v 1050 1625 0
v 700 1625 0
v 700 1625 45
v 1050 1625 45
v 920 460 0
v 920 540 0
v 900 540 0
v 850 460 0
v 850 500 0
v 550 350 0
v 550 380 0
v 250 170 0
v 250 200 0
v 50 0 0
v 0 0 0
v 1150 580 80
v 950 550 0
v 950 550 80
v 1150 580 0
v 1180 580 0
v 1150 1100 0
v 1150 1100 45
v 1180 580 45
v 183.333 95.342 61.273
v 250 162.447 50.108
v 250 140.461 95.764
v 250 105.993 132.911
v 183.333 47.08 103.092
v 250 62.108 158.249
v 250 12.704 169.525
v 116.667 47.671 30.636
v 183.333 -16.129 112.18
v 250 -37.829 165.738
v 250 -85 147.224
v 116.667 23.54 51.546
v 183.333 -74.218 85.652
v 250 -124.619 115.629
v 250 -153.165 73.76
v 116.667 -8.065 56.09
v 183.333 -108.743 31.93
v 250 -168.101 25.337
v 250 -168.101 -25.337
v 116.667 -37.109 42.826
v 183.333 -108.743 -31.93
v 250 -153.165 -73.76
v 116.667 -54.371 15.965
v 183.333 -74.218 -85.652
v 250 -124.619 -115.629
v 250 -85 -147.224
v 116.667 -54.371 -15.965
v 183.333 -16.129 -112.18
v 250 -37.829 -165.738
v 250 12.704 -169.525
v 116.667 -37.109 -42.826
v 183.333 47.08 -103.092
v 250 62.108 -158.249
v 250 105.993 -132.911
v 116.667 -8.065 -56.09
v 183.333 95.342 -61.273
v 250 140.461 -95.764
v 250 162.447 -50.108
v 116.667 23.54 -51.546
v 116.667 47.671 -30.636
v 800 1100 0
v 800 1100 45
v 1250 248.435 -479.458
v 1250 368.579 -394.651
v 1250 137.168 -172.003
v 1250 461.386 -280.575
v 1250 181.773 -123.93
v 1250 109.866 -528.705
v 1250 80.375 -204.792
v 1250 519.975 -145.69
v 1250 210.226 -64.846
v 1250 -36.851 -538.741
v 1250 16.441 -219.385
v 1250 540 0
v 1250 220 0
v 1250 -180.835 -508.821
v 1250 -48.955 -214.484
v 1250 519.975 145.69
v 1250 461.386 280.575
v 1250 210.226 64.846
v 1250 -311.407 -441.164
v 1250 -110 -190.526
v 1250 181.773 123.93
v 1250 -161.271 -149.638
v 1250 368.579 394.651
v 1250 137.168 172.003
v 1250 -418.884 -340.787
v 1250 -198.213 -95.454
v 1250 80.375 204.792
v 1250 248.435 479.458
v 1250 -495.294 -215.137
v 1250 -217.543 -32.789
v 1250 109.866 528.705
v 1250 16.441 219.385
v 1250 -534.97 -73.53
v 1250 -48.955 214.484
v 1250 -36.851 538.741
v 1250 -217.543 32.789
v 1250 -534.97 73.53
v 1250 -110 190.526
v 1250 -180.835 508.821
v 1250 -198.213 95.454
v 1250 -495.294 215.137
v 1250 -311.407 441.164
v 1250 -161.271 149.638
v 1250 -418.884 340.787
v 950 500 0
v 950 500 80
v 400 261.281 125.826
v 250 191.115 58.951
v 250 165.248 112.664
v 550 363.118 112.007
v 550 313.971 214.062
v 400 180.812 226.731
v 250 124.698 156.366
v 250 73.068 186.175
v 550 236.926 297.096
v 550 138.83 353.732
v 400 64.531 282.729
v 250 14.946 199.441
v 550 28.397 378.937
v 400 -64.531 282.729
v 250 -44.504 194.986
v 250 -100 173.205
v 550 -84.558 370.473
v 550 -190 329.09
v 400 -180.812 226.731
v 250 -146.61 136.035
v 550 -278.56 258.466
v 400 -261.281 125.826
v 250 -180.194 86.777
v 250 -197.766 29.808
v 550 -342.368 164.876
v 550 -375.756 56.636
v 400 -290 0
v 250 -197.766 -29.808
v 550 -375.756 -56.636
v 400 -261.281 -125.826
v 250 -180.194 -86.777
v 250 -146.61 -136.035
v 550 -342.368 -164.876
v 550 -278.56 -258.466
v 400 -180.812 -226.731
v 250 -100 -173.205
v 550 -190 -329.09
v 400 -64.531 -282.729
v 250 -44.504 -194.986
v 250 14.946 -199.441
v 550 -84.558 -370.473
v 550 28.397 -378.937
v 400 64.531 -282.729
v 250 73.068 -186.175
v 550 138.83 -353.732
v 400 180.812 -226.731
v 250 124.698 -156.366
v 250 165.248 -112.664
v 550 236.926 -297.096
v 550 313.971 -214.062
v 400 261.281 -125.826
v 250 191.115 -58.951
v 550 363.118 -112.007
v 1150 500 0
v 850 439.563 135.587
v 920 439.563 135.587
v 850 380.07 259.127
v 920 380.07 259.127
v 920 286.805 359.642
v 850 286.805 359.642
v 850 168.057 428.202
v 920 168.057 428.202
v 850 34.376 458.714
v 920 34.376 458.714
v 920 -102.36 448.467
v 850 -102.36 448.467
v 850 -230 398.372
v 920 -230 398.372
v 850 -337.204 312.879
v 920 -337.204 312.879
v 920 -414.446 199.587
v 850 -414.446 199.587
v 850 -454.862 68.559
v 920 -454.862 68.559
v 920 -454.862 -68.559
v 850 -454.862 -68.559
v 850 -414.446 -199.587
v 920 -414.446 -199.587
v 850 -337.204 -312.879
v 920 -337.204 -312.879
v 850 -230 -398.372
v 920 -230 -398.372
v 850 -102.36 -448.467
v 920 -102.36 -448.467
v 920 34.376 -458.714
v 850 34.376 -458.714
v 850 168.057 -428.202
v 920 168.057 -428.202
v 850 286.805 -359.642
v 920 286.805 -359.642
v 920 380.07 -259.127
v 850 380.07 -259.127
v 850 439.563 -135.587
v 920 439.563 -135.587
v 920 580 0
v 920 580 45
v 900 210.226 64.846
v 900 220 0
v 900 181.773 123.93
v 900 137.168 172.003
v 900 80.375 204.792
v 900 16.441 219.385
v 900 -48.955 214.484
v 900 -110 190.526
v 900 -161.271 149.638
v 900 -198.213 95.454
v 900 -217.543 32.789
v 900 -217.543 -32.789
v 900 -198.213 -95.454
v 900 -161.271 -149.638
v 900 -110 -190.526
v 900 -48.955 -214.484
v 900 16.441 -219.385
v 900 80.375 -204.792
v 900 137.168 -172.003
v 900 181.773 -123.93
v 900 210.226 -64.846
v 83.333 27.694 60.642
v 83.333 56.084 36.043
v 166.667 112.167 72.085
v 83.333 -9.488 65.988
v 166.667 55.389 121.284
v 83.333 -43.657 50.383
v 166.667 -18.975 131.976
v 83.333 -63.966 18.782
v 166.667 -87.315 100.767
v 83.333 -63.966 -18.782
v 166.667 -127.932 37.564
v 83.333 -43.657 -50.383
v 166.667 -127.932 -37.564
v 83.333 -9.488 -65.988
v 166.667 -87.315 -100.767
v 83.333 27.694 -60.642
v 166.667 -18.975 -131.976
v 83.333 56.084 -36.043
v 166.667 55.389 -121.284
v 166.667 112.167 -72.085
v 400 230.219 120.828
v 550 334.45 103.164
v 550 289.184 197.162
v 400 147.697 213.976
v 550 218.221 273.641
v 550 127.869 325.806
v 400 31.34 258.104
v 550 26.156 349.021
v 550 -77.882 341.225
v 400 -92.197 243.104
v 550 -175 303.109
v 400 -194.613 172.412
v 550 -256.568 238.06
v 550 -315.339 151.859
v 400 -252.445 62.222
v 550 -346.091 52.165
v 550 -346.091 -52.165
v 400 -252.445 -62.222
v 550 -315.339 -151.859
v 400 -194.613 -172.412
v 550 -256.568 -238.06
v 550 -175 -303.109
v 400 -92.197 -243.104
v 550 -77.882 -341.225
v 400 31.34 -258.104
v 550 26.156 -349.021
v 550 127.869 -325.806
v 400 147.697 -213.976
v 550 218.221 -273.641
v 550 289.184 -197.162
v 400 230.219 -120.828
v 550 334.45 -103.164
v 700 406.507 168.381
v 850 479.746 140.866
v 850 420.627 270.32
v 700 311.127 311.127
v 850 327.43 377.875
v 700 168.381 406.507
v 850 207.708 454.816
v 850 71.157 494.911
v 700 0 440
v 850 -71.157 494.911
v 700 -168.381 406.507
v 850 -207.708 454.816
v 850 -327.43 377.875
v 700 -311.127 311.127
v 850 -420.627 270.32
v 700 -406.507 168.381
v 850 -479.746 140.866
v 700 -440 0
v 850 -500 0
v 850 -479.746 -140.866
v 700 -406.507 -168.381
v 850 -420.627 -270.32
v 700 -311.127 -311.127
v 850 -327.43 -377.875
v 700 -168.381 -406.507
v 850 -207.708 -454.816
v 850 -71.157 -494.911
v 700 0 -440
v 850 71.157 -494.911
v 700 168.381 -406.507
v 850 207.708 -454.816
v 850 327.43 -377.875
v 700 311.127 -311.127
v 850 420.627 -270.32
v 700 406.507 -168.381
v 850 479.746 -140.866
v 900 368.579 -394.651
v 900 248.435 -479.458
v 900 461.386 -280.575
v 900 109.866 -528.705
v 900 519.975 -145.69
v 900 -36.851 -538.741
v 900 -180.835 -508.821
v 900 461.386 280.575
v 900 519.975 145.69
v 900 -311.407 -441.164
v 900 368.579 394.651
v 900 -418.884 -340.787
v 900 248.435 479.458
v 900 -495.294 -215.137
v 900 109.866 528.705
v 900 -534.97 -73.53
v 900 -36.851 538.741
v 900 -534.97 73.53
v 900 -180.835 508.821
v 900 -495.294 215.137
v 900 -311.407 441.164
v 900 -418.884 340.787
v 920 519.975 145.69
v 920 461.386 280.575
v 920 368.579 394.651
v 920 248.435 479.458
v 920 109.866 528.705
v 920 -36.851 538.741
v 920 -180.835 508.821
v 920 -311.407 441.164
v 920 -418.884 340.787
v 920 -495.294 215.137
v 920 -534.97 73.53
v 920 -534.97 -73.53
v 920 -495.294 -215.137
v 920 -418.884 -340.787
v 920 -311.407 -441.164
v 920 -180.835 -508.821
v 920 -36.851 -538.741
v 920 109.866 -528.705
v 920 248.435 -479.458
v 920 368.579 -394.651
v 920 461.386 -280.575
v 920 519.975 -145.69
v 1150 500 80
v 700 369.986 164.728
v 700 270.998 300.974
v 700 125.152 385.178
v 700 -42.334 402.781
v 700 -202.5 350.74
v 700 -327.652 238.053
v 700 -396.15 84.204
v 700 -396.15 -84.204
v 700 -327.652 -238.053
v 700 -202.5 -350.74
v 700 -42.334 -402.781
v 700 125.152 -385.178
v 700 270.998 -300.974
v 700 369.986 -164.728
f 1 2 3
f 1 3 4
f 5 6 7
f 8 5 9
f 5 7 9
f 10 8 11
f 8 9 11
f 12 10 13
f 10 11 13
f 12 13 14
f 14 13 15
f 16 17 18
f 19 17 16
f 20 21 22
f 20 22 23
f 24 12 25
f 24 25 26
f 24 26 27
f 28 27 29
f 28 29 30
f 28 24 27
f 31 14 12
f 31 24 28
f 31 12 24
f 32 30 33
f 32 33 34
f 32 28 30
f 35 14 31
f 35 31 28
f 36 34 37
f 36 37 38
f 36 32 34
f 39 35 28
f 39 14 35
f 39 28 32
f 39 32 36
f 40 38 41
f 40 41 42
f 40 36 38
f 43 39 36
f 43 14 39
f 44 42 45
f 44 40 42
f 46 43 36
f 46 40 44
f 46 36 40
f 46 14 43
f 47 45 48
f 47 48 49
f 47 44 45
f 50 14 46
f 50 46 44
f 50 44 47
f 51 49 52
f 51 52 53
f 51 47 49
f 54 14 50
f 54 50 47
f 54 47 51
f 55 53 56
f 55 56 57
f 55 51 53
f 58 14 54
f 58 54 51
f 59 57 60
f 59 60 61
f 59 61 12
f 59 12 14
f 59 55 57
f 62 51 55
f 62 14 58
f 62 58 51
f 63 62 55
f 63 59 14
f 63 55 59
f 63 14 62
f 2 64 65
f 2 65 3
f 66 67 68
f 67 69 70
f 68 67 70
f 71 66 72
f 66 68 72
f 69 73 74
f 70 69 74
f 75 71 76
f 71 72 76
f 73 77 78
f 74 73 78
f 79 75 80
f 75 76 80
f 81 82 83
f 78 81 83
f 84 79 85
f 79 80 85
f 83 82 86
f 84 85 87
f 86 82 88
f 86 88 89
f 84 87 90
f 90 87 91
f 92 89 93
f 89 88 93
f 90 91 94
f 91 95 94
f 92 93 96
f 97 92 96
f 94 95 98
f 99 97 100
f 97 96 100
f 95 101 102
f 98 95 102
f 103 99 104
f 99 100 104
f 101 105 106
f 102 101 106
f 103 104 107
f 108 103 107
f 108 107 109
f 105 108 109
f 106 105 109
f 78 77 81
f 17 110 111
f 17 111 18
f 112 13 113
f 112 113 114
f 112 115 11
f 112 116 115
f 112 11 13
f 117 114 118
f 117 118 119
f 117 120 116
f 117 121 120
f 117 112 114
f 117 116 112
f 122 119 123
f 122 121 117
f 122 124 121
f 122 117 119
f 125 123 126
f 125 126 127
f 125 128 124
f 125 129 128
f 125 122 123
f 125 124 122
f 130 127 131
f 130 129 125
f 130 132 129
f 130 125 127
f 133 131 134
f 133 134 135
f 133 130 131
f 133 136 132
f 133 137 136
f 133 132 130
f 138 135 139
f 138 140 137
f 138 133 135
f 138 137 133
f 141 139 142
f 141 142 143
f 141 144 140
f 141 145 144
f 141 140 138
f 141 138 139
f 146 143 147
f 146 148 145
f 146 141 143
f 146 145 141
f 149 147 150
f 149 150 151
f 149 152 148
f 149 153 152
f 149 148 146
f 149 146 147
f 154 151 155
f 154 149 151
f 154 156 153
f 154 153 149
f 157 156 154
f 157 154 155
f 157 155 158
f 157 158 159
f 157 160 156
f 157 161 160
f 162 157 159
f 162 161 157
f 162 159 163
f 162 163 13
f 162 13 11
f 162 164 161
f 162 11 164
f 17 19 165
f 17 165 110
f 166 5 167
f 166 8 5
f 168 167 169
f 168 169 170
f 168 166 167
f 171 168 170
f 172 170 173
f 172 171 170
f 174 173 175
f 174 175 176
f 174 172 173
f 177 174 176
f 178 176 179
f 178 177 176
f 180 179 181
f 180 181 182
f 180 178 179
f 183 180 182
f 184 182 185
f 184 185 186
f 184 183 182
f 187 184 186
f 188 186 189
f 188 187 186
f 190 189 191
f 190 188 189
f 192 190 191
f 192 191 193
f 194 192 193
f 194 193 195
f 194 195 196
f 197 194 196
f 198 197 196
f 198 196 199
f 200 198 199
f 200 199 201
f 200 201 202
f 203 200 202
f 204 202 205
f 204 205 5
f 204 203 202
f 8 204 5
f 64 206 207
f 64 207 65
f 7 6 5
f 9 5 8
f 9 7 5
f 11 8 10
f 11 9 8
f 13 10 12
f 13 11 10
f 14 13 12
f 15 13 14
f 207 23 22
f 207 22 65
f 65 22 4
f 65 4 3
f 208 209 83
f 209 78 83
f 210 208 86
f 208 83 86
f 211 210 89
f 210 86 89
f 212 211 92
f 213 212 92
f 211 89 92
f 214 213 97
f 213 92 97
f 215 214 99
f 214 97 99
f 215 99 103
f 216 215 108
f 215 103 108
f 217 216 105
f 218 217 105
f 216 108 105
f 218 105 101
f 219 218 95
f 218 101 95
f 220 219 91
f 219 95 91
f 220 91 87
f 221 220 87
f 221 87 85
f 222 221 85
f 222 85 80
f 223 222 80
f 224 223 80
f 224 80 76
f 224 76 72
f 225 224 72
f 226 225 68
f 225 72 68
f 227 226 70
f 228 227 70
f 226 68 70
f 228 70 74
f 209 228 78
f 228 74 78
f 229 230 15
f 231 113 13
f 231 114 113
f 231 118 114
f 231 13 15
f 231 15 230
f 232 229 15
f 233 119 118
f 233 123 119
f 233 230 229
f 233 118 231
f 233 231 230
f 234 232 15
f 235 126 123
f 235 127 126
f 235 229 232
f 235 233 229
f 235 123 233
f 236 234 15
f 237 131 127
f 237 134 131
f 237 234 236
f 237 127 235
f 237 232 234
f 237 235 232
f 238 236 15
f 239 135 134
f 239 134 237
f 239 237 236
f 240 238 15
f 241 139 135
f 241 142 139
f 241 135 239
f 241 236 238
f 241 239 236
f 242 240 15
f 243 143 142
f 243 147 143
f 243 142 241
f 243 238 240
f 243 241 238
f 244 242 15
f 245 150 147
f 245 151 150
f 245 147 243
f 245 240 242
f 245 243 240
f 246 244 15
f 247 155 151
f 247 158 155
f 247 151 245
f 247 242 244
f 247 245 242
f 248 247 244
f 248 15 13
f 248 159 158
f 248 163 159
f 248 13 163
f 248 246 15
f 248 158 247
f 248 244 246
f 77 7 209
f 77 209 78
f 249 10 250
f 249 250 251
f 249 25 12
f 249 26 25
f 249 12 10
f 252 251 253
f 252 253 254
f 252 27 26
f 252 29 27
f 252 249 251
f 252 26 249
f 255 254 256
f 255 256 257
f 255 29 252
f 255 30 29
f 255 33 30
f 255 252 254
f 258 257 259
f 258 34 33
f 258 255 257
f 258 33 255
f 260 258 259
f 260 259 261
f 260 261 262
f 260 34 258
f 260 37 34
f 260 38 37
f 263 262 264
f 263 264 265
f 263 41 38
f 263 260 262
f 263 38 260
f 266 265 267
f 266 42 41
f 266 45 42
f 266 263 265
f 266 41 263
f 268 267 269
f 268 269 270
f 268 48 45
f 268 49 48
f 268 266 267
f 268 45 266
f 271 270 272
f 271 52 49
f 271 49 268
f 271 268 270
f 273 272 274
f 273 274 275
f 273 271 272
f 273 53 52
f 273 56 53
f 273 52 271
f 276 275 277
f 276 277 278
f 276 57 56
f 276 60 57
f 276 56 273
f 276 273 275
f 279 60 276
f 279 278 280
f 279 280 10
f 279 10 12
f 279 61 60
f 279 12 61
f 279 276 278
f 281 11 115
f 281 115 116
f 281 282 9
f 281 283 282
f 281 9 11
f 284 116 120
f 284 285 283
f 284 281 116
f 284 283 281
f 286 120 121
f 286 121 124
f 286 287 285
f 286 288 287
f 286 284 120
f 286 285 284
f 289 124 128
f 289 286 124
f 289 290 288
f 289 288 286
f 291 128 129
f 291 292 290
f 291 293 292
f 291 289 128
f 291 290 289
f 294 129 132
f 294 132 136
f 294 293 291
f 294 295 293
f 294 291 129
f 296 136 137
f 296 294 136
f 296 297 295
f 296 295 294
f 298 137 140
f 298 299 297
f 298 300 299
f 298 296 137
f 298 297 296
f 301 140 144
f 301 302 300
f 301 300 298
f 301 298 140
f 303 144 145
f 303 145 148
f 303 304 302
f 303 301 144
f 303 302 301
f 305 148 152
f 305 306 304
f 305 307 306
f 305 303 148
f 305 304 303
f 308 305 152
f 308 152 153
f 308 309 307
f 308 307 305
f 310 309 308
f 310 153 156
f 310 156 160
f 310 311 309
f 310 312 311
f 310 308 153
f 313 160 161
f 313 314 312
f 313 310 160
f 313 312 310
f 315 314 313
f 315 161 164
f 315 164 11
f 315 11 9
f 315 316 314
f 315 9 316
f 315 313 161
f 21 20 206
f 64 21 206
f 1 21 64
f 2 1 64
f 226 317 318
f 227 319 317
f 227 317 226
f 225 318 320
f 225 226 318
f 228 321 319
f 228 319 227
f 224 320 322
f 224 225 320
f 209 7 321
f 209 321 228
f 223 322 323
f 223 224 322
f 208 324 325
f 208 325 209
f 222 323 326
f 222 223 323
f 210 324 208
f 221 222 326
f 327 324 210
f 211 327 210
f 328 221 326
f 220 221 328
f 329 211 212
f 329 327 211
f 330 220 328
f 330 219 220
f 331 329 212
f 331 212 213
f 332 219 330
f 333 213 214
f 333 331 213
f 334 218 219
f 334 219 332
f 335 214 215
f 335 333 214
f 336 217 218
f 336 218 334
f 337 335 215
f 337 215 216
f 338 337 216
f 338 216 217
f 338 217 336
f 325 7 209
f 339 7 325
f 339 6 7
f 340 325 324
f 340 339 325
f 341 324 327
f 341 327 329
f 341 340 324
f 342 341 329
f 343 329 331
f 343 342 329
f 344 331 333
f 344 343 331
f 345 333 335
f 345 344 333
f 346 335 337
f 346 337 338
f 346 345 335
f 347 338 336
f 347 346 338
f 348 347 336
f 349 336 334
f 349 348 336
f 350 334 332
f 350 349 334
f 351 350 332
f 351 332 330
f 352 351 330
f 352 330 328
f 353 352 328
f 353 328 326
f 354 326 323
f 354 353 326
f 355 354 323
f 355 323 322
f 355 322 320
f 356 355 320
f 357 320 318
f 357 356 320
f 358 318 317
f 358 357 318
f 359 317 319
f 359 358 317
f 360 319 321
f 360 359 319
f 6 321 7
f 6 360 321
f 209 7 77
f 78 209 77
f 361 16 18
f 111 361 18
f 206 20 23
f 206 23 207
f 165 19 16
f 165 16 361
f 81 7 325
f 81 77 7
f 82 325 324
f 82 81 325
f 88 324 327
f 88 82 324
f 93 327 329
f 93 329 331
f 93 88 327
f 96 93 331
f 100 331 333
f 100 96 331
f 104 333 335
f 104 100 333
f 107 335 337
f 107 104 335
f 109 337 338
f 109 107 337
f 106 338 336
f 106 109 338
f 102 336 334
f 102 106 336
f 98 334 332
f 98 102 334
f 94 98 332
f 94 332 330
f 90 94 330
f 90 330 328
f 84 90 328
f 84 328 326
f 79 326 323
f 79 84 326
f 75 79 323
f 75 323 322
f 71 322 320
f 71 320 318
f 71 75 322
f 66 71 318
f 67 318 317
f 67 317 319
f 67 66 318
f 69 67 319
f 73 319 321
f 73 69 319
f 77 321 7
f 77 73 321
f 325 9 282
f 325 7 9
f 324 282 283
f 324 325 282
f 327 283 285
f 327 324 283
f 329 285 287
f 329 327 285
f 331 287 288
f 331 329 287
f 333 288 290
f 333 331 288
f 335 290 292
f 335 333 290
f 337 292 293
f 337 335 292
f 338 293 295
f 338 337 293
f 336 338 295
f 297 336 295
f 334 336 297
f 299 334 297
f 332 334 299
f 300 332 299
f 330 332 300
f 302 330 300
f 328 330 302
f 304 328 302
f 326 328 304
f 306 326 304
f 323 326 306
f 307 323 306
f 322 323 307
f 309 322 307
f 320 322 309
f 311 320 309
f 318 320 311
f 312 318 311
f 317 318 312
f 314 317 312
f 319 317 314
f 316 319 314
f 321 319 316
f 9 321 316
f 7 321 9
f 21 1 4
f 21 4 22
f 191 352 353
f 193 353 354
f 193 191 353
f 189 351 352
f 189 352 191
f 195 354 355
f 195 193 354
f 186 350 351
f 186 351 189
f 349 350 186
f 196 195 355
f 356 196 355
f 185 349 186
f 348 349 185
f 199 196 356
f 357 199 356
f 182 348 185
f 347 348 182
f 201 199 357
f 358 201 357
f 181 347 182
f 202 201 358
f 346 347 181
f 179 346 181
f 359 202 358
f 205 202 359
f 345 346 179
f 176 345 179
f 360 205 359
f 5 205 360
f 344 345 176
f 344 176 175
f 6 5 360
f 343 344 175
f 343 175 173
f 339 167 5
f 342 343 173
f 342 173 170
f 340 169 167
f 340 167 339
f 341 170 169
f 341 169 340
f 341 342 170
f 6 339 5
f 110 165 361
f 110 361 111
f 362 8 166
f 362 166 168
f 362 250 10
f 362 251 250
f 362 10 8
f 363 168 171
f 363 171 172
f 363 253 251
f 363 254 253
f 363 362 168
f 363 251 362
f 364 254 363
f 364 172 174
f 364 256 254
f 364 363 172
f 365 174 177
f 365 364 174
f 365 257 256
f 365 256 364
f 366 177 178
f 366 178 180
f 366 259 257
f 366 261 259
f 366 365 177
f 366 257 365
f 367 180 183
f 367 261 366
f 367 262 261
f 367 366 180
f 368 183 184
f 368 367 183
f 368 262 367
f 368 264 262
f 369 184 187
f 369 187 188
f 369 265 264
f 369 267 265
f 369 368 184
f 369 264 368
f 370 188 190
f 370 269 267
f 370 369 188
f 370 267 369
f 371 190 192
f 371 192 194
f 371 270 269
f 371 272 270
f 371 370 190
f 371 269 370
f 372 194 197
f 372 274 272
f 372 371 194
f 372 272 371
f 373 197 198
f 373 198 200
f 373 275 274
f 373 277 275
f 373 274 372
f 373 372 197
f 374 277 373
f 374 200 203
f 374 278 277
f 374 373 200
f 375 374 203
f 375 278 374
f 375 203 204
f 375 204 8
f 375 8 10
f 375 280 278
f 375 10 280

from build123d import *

# Parameters (mm, degrees)
REVOLVE1_ANGLE      = 359.999999589
SKETCH2_W           = 350
SKETCH2_H           = 320
REVOLVE2_ANGLE      = 359.999999589
BOSS_EXTRUDE1_DEPTH = 80
BOSS_EXTRUDE2_DEPTH = 45


with BuildPart() as part:
    # Sketch1 → Revolve1 (revolve)
    with BuildSketch(Plane.XY):
        Polygon((0, 0), (250, 200), (550, 380), (850, 500), (900, 540), (920, 540), (920, 460), (850, 460), (550, 350), (250, 170), (50, 0), align=None)
    revolve(axis=Axis((0, 0, 0), (1, 0, 0)), revolution_arc=REVOLVE1_ANGLE)


with BuildPart() as body_2:
    # Sketch2 → Revolve2 (revolve)
    with BuildSketch(Plane.XY):
        with Locations((1075, 380)):
            Rectangle(SKETCH2_W, SKETCH2_H)
    revolve(axis=Axis((0, 0, 0), (1, 0, 0)), revolution_arc=REVOLVE2_ANGLE)


with BuildPart() as body_3:
    # Sketch3 → Boss-Extrude1 (new body)
    with BuildSketch(Plane.XY):
        Polygon((950, 500), (950, 550), (1150, 580), (1150, 500), align=None)
    extrude(amount=BOSS_EXTRUDE1_DEPTH)


with BuildPart() as body_4:
    # Sketch4 → Boss-Extrude2 (new body)
    with BuildSketch(Plane.XY):
        Polygon((920, 580), (800, 1100), (700, 1625), (1050, 1625), (1150, 1100), (1180, 580), align=None)
    extrude(amount=BOSS_EXTRUDE2_DEPTH)


solid = Compound([part.part, body_2.part, body_3.part, body_4.part])
